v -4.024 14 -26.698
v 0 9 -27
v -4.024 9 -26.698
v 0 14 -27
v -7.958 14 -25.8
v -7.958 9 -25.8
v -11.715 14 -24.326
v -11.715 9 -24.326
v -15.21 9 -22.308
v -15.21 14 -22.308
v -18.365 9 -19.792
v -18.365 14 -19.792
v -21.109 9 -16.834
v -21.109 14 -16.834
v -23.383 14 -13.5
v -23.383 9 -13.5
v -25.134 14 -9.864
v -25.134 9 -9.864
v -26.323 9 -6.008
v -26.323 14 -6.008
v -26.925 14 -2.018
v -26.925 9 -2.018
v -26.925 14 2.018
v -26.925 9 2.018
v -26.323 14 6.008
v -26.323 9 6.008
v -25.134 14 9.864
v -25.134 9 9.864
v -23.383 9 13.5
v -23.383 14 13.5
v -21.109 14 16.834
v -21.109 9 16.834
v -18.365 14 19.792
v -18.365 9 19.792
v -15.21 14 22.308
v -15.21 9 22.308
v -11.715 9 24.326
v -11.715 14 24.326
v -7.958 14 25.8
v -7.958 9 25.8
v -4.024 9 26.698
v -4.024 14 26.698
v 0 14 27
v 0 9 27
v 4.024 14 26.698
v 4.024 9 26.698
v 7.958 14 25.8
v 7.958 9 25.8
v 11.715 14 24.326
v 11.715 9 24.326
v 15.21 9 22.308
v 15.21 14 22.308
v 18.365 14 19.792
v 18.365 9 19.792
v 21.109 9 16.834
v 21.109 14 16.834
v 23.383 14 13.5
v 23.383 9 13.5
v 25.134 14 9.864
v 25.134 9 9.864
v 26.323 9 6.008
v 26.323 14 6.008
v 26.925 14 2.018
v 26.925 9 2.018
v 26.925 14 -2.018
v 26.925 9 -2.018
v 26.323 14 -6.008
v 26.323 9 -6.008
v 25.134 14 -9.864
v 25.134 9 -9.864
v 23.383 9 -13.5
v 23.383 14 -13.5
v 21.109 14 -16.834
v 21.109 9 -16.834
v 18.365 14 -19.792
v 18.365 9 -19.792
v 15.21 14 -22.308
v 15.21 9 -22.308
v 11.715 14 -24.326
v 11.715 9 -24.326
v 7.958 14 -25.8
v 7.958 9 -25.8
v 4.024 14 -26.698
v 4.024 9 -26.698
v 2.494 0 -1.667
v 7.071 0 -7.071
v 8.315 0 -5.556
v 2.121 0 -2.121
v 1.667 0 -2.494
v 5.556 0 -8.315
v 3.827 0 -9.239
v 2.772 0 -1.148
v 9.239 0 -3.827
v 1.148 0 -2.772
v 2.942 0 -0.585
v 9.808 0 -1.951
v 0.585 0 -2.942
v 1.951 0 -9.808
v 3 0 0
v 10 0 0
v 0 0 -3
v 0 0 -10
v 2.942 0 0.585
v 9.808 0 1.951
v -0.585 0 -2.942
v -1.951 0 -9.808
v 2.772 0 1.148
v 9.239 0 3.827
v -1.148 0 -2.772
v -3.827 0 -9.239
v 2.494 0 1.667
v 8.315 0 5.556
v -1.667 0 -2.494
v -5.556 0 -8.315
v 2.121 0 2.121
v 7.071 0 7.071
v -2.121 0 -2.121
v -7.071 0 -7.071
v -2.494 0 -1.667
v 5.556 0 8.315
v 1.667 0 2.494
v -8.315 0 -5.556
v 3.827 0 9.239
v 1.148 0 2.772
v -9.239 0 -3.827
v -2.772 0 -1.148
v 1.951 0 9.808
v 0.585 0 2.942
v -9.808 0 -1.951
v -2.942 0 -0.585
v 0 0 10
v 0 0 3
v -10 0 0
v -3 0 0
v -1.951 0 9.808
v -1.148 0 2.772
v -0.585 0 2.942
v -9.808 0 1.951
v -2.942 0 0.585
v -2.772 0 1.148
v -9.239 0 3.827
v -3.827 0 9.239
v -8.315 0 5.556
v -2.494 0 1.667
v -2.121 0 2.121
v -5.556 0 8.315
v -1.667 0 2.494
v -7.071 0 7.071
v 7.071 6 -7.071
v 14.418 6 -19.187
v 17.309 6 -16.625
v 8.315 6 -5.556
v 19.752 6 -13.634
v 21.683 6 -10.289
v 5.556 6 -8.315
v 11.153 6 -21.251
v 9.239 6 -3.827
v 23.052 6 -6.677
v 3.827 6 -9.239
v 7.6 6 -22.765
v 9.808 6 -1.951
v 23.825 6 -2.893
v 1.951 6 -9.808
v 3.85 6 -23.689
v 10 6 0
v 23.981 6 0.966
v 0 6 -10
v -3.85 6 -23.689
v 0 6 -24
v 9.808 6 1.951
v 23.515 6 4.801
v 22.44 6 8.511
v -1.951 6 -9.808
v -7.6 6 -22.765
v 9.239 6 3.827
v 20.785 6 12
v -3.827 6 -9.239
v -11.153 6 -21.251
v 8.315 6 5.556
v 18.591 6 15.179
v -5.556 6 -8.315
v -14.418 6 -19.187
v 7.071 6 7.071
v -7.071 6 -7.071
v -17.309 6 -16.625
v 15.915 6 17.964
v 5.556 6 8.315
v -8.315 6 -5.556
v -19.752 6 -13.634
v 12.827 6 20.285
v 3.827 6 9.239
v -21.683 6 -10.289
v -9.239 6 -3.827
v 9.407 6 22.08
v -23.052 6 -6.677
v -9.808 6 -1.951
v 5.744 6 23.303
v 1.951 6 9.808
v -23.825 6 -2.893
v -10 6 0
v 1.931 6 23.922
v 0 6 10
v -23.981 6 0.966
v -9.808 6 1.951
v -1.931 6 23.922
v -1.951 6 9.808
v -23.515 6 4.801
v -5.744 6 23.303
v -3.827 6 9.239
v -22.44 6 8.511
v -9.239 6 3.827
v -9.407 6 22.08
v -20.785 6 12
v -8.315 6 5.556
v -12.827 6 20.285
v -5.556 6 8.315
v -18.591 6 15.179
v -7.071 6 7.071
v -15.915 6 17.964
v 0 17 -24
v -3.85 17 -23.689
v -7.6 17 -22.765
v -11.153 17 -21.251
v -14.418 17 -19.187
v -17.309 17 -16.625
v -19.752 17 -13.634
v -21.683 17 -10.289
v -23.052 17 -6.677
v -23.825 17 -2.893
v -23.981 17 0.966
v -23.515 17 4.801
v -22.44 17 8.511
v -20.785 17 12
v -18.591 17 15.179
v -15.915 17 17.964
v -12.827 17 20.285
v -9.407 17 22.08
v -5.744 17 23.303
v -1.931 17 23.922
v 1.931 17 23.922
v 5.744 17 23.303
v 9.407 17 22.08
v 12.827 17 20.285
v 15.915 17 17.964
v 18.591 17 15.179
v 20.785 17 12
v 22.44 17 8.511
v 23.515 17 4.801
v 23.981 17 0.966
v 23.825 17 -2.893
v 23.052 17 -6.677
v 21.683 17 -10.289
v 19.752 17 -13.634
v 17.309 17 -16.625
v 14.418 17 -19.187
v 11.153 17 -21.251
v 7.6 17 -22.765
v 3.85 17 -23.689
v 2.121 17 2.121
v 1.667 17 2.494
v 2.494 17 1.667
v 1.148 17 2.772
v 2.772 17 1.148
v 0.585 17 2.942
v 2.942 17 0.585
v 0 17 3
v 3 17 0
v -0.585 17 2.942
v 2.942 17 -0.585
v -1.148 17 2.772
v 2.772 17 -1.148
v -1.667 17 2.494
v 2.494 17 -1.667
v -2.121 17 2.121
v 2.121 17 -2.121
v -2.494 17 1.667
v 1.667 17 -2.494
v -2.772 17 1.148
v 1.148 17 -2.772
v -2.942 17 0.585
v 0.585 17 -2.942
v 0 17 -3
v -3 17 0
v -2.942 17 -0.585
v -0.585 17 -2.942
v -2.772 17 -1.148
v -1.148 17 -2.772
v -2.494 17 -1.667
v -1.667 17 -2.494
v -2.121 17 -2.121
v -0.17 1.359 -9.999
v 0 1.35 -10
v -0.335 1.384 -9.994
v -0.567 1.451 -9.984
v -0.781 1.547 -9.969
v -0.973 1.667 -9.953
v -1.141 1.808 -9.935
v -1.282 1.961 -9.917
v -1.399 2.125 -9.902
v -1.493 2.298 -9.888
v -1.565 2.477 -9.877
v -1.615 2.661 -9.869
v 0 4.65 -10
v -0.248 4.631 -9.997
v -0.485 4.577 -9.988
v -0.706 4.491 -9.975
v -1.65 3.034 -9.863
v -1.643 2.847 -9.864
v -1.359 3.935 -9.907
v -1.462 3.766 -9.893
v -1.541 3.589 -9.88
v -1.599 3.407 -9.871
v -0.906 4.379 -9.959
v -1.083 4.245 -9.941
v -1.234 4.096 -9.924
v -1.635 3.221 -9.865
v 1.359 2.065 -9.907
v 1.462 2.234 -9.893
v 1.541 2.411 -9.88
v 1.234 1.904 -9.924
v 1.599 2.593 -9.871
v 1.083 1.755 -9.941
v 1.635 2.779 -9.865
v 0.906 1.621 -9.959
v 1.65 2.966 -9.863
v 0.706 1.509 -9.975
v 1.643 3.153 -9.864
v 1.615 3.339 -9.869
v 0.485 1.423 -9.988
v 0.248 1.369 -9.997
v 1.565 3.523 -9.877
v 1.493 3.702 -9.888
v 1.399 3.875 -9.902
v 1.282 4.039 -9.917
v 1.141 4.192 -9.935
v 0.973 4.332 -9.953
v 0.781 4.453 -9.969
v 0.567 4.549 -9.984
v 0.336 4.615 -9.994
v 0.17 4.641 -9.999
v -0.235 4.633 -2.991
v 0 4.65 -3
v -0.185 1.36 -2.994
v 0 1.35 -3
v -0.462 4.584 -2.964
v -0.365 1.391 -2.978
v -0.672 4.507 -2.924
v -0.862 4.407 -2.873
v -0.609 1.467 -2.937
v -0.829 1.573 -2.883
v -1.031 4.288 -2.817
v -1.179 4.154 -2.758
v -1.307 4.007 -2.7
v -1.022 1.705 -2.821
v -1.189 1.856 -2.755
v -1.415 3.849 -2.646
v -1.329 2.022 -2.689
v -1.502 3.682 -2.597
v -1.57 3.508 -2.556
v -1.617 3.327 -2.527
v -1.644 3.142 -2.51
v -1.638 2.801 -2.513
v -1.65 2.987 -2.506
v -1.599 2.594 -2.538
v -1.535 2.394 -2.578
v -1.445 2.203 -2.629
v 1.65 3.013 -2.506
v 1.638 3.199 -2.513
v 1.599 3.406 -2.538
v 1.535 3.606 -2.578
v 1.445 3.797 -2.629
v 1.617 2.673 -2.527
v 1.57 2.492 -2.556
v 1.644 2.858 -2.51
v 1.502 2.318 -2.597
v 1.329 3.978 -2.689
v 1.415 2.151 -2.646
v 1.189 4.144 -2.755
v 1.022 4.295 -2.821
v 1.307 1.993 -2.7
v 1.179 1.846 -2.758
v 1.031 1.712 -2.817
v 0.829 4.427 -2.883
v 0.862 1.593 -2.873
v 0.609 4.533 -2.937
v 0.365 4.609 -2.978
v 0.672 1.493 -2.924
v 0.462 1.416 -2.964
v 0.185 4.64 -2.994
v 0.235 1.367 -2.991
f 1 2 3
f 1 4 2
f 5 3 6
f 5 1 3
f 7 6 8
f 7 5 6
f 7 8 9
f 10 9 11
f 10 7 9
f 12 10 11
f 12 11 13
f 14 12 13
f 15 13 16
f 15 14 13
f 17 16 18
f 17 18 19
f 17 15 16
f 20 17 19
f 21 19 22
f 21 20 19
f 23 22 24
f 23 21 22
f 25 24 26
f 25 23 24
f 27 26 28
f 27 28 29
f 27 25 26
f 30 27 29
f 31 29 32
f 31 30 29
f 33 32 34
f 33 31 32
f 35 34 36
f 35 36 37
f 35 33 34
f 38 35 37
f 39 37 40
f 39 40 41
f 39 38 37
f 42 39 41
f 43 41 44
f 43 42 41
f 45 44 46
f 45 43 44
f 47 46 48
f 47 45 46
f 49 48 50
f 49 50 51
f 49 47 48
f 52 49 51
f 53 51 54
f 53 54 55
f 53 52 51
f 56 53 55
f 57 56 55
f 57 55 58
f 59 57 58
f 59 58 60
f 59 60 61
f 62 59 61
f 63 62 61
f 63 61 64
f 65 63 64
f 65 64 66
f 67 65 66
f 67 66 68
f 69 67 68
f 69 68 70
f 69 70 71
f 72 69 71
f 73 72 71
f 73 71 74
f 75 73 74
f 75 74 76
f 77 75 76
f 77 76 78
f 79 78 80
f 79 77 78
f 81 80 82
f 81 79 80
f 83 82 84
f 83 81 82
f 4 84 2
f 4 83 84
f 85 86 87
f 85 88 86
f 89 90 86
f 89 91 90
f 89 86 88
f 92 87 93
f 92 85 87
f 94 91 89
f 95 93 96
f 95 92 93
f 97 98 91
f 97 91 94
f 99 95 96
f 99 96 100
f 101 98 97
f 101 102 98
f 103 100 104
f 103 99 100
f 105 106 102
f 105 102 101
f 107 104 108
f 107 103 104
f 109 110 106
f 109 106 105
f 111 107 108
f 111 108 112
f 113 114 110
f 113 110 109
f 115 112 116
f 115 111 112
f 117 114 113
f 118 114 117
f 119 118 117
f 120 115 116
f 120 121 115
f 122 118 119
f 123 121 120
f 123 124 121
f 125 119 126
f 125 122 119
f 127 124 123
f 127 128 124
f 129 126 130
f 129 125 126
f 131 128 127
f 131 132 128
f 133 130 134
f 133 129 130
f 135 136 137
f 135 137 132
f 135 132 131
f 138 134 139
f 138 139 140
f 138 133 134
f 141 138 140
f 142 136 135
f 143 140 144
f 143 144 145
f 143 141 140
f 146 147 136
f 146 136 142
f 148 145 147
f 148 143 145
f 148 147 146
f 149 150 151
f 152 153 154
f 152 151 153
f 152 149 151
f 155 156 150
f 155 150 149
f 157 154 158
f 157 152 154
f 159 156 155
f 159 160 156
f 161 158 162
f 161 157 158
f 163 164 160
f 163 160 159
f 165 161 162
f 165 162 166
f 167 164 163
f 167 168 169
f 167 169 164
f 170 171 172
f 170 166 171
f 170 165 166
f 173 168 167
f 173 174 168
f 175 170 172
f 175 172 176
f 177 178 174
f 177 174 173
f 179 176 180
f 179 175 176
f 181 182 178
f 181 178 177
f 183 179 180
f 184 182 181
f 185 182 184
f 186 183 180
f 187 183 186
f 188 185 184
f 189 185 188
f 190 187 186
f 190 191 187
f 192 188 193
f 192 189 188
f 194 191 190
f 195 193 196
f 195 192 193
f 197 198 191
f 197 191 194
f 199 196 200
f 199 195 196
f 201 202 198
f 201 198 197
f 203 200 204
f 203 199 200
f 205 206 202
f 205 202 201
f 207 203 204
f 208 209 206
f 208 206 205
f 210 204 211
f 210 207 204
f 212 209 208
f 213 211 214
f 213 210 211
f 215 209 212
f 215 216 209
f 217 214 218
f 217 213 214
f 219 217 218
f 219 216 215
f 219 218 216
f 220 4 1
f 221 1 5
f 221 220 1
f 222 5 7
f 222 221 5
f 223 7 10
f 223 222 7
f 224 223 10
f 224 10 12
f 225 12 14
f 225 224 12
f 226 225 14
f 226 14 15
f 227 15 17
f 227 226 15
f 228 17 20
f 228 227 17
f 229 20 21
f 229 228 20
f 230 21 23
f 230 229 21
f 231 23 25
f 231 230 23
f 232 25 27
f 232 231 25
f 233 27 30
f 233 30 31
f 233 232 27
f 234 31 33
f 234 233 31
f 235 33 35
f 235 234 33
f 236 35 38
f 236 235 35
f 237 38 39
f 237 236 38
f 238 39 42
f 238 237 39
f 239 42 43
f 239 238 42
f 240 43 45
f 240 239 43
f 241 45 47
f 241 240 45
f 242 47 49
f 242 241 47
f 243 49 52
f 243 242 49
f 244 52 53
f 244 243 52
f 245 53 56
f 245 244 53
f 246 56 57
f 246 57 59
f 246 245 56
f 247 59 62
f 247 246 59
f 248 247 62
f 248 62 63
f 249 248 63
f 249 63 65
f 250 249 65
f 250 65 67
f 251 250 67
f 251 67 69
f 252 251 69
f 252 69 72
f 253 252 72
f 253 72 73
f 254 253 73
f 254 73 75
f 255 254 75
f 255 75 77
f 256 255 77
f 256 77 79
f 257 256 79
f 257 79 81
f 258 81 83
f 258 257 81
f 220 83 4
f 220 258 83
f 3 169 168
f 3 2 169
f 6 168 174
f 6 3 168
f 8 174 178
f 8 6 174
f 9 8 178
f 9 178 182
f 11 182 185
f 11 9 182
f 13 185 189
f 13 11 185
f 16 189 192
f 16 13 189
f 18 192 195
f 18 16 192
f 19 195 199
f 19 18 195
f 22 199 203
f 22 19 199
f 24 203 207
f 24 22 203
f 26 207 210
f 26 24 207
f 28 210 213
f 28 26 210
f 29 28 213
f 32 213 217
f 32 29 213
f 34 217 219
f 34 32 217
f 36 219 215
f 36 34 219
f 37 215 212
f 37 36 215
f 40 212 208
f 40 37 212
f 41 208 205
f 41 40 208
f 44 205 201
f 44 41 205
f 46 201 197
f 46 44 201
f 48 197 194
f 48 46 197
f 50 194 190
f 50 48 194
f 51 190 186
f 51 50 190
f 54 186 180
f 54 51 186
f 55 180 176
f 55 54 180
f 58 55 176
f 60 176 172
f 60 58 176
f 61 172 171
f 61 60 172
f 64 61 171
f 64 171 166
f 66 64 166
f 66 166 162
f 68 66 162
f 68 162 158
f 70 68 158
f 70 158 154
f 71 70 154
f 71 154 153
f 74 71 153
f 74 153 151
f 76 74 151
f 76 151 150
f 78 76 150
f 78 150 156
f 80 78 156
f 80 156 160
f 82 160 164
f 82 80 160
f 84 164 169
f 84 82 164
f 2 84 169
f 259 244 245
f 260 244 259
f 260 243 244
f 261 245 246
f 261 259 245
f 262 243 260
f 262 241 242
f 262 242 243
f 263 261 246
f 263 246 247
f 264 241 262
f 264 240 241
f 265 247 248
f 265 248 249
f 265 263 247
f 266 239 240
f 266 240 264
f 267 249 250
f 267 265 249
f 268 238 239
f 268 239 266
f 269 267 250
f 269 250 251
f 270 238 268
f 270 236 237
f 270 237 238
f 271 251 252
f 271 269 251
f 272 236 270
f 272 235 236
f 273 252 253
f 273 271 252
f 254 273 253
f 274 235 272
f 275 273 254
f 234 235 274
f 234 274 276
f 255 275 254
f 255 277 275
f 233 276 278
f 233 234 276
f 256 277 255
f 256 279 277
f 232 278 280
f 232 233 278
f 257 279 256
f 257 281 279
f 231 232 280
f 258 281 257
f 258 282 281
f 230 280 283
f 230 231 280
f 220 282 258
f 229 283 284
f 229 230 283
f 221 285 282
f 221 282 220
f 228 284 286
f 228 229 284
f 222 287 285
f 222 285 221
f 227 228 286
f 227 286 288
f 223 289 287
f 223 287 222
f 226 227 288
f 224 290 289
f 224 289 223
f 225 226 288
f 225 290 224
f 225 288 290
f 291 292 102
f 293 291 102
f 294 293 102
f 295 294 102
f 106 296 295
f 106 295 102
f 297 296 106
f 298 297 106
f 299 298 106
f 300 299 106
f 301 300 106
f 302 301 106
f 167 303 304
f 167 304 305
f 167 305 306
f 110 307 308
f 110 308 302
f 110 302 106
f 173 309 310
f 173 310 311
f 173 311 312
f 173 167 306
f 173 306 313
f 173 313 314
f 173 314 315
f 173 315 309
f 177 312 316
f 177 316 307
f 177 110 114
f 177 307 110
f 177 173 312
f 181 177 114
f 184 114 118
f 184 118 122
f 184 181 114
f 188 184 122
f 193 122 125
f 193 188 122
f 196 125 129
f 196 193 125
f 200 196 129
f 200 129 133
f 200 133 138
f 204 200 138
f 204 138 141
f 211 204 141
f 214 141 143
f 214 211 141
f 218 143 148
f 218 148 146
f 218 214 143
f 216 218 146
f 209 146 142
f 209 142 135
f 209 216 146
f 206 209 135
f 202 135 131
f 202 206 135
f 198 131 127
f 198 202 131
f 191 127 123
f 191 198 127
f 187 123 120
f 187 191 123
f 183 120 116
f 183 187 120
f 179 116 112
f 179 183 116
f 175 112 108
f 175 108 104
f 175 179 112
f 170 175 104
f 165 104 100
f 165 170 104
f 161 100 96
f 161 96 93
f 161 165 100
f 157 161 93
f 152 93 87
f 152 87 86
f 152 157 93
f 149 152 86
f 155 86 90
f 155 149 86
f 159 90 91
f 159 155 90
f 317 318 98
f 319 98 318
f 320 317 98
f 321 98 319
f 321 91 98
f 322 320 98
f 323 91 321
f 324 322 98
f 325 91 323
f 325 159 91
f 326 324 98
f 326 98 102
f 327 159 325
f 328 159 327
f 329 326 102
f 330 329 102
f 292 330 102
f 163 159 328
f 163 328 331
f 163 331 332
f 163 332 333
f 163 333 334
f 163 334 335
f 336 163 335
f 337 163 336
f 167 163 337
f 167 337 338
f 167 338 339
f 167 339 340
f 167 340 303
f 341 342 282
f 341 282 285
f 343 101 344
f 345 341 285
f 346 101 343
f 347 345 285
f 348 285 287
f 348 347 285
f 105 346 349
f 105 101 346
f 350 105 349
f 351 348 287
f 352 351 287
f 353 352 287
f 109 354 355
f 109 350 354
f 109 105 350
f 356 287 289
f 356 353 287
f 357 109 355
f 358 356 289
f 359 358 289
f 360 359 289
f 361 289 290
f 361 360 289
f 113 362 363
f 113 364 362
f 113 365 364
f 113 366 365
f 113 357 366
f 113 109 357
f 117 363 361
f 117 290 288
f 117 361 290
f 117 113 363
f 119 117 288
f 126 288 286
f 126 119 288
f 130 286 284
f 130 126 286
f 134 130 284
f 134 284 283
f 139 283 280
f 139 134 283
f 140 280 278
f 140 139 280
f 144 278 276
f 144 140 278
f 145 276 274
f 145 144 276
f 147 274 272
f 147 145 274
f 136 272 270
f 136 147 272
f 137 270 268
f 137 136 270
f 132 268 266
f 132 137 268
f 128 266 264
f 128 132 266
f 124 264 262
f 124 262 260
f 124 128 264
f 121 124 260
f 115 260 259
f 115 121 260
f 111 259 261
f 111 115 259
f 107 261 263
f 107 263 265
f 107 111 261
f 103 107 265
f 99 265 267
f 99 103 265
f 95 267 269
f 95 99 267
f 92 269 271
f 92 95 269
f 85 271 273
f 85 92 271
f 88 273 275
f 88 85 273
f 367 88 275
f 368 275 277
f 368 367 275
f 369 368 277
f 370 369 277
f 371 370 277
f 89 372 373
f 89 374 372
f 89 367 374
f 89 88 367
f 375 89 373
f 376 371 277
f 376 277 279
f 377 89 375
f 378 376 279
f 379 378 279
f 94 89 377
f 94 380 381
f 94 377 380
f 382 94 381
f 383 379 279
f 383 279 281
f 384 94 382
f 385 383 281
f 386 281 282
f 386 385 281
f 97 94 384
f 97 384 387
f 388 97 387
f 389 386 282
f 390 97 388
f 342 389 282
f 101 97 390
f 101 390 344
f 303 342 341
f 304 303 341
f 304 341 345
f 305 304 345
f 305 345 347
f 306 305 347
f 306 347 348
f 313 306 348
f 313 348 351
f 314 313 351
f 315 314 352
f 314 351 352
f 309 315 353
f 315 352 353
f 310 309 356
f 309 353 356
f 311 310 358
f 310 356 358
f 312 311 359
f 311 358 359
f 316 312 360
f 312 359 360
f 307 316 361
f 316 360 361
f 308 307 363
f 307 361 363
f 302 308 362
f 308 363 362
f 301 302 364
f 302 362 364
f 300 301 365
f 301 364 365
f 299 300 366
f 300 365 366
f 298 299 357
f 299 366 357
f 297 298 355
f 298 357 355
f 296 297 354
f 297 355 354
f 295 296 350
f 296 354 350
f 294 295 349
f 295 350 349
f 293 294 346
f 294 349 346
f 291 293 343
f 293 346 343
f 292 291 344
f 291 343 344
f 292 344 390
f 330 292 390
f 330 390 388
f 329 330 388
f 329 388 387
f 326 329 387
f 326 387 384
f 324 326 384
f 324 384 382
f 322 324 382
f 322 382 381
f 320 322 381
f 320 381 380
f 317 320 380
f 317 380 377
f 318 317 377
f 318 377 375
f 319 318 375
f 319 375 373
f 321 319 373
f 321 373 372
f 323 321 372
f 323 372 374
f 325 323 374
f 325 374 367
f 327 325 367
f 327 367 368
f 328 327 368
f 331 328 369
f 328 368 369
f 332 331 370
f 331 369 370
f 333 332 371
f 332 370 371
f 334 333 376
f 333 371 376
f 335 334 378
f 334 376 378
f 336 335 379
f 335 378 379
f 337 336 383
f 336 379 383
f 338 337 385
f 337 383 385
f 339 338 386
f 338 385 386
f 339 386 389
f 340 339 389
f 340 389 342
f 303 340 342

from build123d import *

# Parameters (mm, degrees)
SKETCH2_R          = 1.65
CUT_EXTRUDE1_DEPTH = 42.797129088


with BuildPart() as part:
    # Sketch1 → Revolve1 (revolve)
    with BuildSketch(Plane.XY, mode=Mode.PRIVATE) as revolve1_sk:
        Polygon((10, 0), (10, 6), (24, 6), (27, 9), (27, 14), (24, 17), (3, 17), (3, 0), align=None)
    revolve(revolve1_sk.sketch.rotate(Axis((0, 0, 0), (0, 1, 0)), 90), axis=Axis((0, 0, 0), (0, 1, 0)))

    # Sketch2 → Cut-Extrude1 (cut, through all)
    with BuildSketch(Plane.XY):
        with Locations(Location((0, 3, 0), (0, 0, 90))):
            Circle(SKETCH2_R)
    extrude(amount=-CUT_EXTRUDE1_DEPTH, mode=Mode.SUBTRACT)


solid = part.part
